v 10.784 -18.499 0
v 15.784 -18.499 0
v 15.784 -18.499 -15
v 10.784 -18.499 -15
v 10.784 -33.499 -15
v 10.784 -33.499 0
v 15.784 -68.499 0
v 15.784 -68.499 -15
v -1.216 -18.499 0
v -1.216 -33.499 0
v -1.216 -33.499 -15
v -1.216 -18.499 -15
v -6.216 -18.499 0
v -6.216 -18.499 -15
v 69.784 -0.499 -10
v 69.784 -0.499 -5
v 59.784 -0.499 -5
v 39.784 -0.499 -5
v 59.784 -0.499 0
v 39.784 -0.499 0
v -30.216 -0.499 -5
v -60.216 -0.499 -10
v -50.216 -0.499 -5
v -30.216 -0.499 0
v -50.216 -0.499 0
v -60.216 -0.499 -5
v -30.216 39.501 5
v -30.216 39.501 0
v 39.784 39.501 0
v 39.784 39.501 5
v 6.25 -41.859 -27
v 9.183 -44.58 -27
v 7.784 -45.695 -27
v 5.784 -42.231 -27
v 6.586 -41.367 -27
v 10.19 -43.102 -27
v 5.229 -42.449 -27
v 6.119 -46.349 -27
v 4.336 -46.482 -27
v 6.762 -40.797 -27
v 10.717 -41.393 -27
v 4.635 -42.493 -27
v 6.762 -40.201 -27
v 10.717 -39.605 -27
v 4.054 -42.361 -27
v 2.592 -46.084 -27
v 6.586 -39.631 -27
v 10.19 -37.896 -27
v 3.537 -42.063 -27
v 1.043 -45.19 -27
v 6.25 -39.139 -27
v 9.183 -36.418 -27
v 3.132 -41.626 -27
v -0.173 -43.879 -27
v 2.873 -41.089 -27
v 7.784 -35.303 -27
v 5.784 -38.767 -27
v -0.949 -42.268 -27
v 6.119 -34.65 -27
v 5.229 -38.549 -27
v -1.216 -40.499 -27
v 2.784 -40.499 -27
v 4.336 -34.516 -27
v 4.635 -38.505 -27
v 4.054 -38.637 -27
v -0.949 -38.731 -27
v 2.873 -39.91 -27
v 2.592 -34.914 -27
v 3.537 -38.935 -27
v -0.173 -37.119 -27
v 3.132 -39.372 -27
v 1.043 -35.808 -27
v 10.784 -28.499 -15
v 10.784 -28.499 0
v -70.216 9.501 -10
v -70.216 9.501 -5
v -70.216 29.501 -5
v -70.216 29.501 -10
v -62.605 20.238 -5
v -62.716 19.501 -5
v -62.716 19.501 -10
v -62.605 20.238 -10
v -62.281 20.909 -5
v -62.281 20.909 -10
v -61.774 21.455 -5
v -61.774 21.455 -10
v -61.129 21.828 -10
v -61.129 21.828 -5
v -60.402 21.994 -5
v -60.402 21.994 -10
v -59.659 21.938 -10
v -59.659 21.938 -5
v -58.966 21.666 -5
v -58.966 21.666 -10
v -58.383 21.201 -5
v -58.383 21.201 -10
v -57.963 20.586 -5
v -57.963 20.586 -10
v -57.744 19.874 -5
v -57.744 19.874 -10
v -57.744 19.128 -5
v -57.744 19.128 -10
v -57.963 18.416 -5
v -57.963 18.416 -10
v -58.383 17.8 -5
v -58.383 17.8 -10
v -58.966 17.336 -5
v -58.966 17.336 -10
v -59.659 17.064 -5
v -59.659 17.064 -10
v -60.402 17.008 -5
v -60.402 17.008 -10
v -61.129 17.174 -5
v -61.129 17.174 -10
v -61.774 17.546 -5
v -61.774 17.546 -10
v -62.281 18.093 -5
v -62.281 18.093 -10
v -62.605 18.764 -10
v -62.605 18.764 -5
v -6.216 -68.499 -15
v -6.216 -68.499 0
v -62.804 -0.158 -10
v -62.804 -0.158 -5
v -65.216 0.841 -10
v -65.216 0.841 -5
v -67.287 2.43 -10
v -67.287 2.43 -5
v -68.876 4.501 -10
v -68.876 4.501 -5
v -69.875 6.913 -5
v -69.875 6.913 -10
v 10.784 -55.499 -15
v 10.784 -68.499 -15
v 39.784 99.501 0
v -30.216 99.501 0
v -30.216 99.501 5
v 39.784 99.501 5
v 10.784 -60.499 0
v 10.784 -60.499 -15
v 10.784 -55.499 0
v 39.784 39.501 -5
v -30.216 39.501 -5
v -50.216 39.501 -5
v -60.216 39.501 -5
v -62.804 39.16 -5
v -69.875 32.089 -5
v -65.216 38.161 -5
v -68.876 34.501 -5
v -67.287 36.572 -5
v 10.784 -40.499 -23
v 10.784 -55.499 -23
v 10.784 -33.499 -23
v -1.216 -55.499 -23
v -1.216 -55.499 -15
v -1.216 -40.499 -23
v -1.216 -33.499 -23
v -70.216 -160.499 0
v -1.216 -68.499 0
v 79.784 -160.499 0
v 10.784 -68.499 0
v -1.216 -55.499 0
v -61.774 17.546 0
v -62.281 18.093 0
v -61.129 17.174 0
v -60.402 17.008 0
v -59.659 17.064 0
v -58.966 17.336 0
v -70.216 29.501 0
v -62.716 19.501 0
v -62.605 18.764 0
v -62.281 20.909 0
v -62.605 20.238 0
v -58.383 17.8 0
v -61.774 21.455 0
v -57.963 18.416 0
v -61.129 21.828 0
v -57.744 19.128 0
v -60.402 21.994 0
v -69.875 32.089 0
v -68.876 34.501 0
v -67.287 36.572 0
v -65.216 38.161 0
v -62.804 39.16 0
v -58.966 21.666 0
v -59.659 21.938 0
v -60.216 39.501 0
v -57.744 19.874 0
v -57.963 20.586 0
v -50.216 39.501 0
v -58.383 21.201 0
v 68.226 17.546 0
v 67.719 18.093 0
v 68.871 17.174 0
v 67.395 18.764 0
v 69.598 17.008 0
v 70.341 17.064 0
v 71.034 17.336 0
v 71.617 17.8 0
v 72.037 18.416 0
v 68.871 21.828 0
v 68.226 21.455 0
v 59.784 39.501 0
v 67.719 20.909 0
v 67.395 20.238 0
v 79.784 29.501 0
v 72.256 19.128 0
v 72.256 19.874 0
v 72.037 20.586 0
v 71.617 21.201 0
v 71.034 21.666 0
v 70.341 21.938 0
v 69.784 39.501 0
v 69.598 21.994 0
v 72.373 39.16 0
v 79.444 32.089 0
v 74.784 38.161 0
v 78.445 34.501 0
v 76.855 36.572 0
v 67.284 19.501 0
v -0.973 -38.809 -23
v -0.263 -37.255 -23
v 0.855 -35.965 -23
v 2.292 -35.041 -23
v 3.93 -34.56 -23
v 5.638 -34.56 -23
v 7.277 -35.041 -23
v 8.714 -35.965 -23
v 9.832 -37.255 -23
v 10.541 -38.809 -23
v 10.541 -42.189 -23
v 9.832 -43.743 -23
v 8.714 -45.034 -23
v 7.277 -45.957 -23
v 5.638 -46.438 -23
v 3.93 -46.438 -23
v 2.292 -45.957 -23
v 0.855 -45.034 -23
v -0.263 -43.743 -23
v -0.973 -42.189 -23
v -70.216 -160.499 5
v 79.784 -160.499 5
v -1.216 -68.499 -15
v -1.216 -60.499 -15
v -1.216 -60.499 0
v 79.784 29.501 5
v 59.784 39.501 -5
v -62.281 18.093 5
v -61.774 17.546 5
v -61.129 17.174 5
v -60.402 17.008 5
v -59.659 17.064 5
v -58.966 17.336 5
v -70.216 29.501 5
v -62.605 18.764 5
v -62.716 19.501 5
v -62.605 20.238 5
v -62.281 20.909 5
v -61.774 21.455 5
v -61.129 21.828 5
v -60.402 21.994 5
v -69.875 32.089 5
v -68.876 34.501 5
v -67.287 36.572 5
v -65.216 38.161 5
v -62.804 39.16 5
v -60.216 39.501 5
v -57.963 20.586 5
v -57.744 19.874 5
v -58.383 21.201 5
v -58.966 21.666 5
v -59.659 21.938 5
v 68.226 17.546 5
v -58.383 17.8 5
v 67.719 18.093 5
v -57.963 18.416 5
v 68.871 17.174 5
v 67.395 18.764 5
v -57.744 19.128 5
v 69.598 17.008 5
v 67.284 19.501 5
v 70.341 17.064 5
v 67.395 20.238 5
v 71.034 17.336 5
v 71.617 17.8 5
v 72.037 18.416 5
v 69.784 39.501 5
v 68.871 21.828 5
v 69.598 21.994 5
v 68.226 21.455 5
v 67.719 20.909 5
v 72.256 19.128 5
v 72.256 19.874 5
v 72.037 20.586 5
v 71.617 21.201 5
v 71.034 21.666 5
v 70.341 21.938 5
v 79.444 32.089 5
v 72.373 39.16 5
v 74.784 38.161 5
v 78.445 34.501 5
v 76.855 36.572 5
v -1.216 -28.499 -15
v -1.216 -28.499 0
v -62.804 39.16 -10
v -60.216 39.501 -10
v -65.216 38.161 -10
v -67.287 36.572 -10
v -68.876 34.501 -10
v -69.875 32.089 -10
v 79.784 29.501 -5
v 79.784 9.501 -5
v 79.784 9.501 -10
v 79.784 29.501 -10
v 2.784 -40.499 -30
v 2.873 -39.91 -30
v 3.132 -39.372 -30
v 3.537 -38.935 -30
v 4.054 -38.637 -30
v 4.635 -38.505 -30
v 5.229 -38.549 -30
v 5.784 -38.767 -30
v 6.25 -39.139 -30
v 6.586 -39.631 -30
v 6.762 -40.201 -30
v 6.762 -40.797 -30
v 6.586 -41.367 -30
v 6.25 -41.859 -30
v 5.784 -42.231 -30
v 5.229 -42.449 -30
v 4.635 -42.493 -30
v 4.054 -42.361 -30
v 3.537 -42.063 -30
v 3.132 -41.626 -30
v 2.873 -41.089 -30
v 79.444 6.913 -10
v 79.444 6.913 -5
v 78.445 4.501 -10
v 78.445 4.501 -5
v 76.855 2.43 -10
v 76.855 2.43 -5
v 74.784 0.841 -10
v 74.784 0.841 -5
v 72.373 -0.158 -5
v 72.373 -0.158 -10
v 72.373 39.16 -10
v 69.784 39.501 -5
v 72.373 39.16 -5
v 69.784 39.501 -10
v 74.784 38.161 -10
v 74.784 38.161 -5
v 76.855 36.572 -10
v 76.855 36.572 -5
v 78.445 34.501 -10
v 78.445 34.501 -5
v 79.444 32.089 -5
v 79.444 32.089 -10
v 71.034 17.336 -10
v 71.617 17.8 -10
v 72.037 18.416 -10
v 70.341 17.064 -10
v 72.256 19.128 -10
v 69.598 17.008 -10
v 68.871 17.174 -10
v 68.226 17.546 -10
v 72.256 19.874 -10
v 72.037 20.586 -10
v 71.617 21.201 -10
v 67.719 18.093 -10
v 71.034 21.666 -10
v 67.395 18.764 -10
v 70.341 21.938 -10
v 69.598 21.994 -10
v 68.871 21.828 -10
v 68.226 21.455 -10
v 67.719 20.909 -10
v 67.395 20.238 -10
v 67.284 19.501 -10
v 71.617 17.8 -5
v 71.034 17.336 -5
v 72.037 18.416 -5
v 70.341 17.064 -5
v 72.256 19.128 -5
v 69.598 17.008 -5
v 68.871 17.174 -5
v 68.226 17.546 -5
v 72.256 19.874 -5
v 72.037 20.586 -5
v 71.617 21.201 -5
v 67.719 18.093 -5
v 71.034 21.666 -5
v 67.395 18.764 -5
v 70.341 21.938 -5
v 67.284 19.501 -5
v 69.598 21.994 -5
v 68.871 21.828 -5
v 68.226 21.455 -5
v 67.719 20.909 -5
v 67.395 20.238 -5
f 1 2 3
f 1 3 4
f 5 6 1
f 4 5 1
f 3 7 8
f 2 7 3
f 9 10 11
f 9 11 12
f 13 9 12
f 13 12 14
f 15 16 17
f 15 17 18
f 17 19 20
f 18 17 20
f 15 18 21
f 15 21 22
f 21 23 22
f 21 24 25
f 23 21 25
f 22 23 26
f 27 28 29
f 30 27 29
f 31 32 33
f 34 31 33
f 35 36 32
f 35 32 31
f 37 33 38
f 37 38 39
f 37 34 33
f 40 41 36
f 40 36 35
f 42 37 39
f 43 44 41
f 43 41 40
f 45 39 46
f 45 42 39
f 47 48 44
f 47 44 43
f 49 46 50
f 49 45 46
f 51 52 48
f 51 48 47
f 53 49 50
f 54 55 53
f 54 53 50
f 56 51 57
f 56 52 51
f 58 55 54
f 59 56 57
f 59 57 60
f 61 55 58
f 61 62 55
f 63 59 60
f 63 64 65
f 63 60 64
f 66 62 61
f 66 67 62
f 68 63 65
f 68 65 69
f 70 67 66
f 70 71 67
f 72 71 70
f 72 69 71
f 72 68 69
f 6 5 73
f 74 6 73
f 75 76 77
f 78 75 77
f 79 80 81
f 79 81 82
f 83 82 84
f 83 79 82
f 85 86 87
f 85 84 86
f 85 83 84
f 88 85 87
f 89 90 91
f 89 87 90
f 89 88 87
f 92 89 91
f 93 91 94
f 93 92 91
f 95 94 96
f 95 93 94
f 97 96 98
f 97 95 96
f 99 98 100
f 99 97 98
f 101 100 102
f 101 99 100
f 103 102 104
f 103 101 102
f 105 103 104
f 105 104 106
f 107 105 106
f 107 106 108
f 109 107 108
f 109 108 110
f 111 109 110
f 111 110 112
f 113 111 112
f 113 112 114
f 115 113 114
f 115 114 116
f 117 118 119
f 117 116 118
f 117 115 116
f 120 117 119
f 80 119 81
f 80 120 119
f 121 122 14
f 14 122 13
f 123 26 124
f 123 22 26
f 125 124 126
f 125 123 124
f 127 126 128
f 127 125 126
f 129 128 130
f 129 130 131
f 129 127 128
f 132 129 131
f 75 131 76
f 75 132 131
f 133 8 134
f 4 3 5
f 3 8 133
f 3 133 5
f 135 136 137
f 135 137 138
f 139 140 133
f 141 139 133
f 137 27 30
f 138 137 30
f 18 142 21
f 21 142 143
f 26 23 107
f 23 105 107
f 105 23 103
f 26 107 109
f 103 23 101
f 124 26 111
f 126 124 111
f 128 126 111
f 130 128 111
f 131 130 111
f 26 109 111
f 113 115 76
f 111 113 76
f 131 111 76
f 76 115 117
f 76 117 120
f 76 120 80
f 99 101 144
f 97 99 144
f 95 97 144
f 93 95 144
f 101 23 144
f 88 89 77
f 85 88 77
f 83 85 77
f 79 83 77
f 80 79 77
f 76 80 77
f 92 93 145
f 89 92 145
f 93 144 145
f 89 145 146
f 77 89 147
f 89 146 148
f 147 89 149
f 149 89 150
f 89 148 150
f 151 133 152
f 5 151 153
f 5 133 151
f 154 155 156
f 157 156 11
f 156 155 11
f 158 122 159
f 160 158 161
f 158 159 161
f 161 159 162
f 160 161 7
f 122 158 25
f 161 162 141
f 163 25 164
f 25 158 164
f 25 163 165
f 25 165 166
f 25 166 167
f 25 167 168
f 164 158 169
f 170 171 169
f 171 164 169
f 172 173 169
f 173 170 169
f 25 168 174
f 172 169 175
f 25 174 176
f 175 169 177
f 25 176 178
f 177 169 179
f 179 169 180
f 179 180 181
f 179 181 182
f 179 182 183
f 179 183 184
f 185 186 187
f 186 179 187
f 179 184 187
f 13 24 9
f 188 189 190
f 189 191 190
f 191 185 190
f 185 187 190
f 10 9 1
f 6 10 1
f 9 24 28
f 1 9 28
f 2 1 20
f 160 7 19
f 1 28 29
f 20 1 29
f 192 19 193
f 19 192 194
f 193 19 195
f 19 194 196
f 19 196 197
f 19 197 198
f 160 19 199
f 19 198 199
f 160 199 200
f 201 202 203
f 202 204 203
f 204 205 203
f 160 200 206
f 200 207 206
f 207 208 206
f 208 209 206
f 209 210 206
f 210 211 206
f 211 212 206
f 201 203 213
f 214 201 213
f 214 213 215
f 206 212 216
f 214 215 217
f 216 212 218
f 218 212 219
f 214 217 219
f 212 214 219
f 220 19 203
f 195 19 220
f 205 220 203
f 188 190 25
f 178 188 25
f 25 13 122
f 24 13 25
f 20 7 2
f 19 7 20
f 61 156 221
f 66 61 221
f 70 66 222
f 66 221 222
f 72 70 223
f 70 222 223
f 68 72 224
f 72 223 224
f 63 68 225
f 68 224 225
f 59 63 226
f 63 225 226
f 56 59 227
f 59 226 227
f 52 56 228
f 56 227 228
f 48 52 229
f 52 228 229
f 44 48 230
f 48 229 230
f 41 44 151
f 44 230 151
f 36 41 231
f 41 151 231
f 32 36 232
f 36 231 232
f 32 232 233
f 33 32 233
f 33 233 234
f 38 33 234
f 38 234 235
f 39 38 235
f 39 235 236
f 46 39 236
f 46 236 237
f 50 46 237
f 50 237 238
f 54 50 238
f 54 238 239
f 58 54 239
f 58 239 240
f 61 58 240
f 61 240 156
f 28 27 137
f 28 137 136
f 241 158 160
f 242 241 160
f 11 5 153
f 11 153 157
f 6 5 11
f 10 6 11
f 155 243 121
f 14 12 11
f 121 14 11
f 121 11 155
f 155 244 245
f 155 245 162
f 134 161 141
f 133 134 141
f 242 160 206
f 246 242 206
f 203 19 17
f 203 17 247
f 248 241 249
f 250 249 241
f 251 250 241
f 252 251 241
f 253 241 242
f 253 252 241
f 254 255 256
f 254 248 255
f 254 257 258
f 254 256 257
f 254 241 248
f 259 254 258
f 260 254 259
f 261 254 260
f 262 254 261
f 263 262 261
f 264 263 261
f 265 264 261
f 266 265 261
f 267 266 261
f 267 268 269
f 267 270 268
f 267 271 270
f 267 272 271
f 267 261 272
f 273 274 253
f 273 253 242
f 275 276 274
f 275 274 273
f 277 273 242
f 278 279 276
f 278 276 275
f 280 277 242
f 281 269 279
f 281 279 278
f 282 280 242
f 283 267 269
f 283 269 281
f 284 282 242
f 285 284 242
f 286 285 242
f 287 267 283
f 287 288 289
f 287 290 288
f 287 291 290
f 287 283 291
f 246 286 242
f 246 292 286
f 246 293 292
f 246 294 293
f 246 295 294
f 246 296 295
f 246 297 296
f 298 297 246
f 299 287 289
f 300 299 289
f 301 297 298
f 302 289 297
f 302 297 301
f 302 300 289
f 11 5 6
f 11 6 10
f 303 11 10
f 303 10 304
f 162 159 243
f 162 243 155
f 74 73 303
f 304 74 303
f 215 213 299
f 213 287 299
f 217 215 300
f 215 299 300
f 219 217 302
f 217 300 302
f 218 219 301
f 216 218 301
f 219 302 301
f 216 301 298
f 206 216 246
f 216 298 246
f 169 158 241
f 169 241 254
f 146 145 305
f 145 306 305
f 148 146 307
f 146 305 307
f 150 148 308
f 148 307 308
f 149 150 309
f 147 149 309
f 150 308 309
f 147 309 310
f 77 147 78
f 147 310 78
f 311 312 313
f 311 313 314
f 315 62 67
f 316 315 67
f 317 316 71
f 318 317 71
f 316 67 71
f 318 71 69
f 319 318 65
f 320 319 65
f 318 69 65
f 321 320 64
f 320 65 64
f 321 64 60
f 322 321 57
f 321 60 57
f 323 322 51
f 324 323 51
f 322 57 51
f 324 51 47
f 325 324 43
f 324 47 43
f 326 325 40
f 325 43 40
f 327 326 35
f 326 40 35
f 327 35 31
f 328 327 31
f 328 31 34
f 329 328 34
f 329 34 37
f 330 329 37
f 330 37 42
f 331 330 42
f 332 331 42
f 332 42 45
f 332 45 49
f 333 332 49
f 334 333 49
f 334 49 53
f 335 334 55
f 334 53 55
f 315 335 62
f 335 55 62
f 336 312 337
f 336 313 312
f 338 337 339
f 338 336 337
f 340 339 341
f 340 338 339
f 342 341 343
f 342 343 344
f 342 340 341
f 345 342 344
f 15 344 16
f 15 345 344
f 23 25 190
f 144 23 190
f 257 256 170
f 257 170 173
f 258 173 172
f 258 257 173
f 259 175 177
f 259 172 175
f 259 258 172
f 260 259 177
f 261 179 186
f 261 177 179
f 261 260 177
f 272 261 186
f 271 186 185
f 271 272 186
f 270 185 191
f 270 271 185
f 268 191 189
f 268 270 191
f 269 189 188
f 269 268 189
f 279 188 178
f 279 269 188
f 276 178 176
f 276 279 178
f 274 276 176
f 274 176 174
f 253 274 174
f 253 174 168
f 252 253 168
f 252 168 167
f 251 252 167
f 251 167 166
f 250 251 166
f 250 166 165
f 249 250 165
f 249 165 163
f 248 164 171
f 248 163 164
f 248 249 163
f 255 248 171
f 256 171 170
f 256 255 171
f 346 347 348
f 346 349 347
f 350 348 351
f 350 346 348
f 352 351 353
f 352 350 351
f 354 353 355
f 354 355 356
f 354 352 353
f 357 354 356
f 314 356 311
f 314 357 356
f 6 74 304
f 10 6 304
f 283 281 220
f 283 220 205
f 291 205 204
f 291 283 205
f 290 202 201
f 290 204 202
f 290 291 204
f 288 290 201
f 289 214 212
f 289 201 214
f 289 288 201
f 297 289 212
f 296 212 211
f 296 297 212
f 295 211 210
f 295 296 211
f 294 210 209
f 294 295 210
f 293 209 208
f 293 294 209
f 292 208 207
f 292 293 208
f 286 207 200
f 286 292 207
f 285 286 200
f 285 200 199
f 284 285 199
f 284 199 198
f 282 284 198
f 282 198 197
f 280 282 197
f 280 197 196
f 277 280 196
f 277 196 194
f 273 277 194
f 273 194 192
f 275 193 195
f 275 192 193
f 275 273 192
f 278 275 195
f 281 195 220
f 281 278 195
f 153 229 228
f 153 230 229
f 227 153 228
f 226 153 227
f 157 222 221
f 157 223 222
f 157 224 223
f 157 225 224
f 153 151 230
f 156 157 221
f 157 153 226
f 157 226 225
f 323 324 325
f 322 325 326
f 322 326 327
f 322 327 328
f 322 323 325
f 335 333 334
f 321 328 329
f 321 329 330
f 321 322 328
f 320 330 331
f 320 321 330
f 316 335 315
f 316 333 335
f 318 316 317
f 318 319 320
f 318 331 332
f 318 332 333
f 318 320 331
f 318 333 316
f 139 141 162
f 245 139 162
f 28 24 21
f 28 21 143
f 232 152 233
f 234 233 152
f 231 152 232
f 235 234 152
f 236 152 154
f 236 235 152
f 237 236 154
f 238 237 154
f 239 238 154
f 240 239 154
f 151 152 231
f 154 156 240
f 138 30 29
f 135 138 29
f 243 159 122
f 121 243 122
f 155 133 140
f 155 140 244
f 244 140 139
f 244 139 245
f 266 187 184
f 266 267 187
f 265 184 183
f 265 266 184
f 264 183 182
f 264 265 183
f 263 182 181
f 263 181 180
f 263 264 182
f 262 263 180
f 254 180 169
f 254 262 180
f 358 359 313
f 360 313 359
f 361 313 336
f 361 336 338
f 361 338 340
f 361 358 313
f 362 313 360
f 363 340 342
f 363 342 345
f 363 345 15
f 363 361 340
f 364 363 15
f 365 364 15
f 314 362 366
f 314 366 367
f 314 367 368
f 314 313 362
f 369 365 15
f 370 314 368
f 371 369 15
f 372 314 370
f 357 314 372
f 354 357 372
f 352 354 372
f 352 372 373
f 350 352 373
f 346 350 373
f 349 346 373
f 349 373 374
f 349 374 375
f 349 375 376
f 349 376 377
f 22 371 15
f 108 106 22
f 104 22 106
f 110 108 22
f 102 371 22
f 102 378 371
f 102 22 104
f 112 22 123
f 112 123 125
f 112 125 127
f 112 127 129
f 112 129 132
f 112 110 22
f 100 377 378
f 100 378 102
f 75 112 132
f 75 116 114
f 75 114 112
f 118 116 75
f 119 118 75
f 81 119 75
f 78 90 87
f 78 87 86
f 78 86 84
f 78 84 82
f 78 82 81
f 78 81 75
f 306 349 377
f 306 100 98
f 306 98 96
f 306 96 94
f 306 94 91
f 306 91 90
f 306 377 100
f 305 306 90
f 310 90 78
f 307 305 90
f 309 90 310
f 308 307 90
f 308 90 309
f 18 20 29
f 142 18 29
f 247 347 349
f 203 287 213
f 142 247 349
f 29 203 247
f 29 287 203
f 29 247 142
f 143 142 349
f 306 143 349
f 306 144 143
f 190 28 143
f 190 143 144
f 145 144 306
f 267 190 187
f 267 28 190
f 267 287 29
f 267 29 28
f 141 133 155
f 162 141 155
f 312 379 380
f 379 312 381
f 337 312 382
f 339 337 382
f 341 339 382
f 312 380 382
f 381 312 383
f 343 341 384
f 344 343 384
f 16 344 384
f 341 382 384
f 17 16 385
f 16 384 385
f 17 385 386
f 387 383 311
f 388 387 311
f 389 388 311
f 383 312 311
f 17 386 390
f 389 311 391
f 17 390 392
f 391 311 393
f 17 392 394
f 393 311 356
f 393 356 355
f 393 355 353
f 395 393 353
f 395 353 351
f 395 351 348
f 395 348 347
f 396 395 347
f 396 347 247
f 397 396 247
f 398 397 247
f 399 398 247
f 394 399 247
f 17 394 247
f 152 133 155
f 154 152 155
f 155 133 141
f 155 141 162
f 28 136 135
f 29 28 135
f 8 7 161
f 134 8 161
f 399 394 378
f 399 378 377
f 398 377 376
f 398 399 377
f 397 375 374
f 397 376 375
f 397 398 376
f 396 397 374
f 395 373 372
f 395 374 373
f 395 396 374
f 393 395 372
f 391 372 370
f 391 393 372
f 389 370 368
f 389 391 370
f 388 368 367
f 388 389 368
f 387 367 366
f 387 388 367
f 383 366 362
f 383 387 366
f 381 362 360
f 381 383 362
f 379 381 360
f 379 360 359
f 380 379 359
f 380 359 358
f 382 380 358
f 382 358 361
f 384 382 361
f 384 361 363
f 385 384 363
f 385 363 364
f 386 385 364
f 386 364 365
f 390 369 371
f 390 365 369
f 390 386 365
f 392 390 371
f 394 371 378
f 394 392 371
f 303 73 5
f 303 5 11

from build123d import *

# Parameters (mm, degrees)
SKETCH2_W               = 150
SKETCH2_H               = 200
BOSS_EXTRUDE1_DEPTH     = 5
SKETCH4_W               = 20
SKETCH4_H               = 40
BOSS_EXTRUDE2_DEPTH     = 5
SKETCH6_W               = 150
SKETCH6_H               = 40
BOSS_EXTRUDE3_DEPTH     = 5
CUT_EXTRUDE1_DEPTH      = 180.514612304
CUT_EXTRUDE1_DEPTH_BACK = 180.514612304
SKETCH7_R               = 2.5
FILLET1_R               = 10
FILLET2_R               = 10
FILLET3_R               = 10
FILLET4_R               = 10
FILLET5_R               = 10
FILLET6_R               = 10
SKETCH9_W               = 12
SKETCH9_H               = 22
BOSS_EXTRUDE4_DEPTH     = 23
SKETCH10_R              = 6
BOSS_EXTRUDE5_DEPTH     = 4
SKETCH11_R              = 2
BOSS_EXTRUDE6_DEPTH     = 3
SKETCH12_W              = 5
SKETCH12_H              = 50
BOSS_EXTRUDE7_DEPTH     = 15
SKETCH13_W              = 12
SKETCH13_H              = 5
BOSS_EXTRUDE10_DEPTH    = 15
BOSS_EXTRUDE10_2_DEPTH  = 15
SKETCH15_W              = 70
SKETCH15_H              = 15
BOSS_EXTRUDE11_DEPTH    = 60
SKETCH16_W              = 70
SKETCH16_H              = 10
CUT_EXTRUDE2_DEPTH      = 60


with BuildPart() as part:
    # Sketch2 → Boss-Extrude1 (new body)
    with BuildSketch(Plane.XY):
        with Locations((4.784343526, -60.49907962)):
            Rectangle(SKETCH2_W, SKETCH2_H)
    extrude(amount=BOSS_EXTRUDE1_DEPTH)

    # Sketch4 → Boss-Extrude2 (add)
    with BuildSketch(Plane(origin=(0, 0, 0), x_dir=(-1, 0, 0), z_dir=(0, 0, -1))):
        with Locations((-49.784343526, 19.50092038)):
            Rectangle(SKETCH4_W, SKETCH4_H)
        with Locations((40.215656474, 19.50092038)):
            Rectangle(SKETCH4_W, SKETCH4_H)
    extrude(amount=BOSS_EXTRUDE2_DEPTH)

    # Sketch6 → Boss-Extrude3 (add)
    with BuildSketch(Plane(origin=(0, 0, -5), x_dir=(-1, 0, 0), z_dir=(0, 0, -1))):
        with Locations((-4.784343526, 19.50092038)):
            Rectangle(SKETCH6_W, SKETCH6_H)
    extrude(amount=BOSS_EXTRUDE3_DEPTH)

    # Sketch7 → Cut-Extrude1 (cut, two sides: drawn at the far end of the back side and taken through both)
    with BuildSketch(Plane(origin=(0, 0, 0), x_dir=(-1, 0, 0), z_dir=(0, 0, -1)).offset(-CUT_EXTRUDE1_DEPTH_BACK)):
        with Locations((-69.784343526, 19.50092038)):
            Circle(SKETCH7_R)
        with Locations((60.215656474, 19.50092038)):
            Circle(SKETCH7_R)
    extrude(amount=CUT_EXTRUDE1_DEPTH + CUT_EXTRUDE1_DEPTH_BACK, mode=Mode.SUBTRACT)

    # Fillet1
    fillet1_edges = [part.edges().sort_by_distance(p)[0] for p in [
        (-70.215656474, 39.50092038, -7.5),
    ]]
    fillet(fillet1_edges, radius=FILLET1_R)

    # Fillet2
    fillet2_edges = [part.edges().sort_by_distance(p)[0] for p in [
        (-70.215656474, 39.50092038, 2.5),
    ]]
    fillet(fillet2_edges, radius=FILLET2_R)

    # Fillet3
    fillet3_edges = [part.edges().sort_by_distance(p)[0] for p in [
        (79.784343526, 39.50092038, 2.5),
    ]]
    fillet(fillet3_edges, radius=FILLET3_R)

    # Fillet4
    fillet4_edges = [part.edges().sort_by_distance(p)[0] for p in [
        (79.784343526, 39.50092038, -7.5),
    ]]
    fillet(fillet4_edges, radius=FILLET4_R)

    # Fillet5
    fillet5_edges = [part.edges().sort_by_distance(p)[0] for p in [
        (79.784343526, -0.49907962, -7.5),
    ]]
    fillet(fillet5_edges, radius=FILLET5_R)

    # Fillet6
    fillet6_edges = [part.edges().sort_by_distance(p)[0] for p in [
        (-70.215656474, -0.49907962, -7.5),
    ]]
    fillet(fillet6_edges, radius=FILLET6_R)

    # Sketch9 → Boss-Extrude4 (add)
    with BuildSketch(Plane(origin=(0, 0, 0), x_dir=(-1, 0, 0), z_dir=(0, 0, -1))):
        with Locations((-4.784343526, -44.49907962)):
            Rectangle(SKETCH9_W, SKETCH9_H)
    extrude(amount=BOSS_EXTRUDE4_DEPTH)

    # Sketch10 → Boss-Extrude5 (add)
    with BuildSketch(Plane(origin=(0, 0, -23), x_dir=(-1, 0, 0), z_dir=(0, 0, -1))):
        with Locations((-4.784343526, -40.49907962)):
            Circle(SKETCH10_R)
    extrude(amount=BOSS_EXTRUDE5_DEPTH)

    # Sketch11 → Boss-Extrude6 (add)
    with BuildSketch(Plane(origin=(0, 0, -27), x_dir=(-1, 0, 0), z_dir=(0, 0, -1))):
        with Locations((-4.784343526, -40.49907962)):
            Circle(SKETCH11_R)
    extrude(amount=BOSS_EXTRUDE6_DEPTH)

    # Sketch12 → Boss-Extrude7 (add)
    with BuildSketch(Plane(origin=(0, 0, 0), x_dir=(-1, 0, 0), z_dir=(0, 0, -1))):
        with Locations((-13.284343526, -43.49907962)):
            Rectangle(SKETCH12_W, SKETCH12_H)
        with Locations((3.715656474, -43.49907962)):
            Rectangle(SKETCH12_W, SKETCH12_H)
    extrude(amount=BOSS_EXTRUDE7_DEPTH)


with BuildPart() as body_2:
    # Sketch13 → Boss-Extrude10 (new body)
    with BuildSketch(Plane(origin=(0, 0, -15), x_dir=(-1, 0, 0), z_dir=(0, 0, -1))):
        with Locations((-4.784343526, -30.99907962)):
            Rectangle(SKETCH13_W, SKETCH13_H)
    extrude(amount=-BOSS_EXTRUDE10_DEPTH)


with BuildPart() as body_3:
    # Sketch13 → Boss-Extrude10 2 (new body)
    with BuildSketch(Plane(origin=(0, 0, -15), x_dir=(-1, 0, 0), z_dir=(0, 0, -1))):
        with Locations((-4.784343526, -57.99907962)):
            Rectangle(SKETCH13_W, SKETCH13_H)
    extrude(amount=-BOSS_EXTRUDE10_2_DEPTH)


with BuildPart() as body_4:
    # Sketch15 → Boss-Extrude11 (new body)
    with BuildSketch(Plane(origin=(0, 39.50092038, 0), x_dir=(1, 0, 0), z_dir=(0, 1, 0))):
        with Locations((4.784343526, 2.5)):
            Rectangle(SKETCH15_W, SKETCH15_H)
    extrude(amount=BOSS_EXTRUDE11_DEPTH)

    # Sketch16 → Cut-Extrude2 (cut)
    with BuildSketch(Plane(origin=(0, 99.50092038, 0), x_dir=(1, 0, 0), z_dir=(0, 1, 0))):
        with Locations((4.784343526, 5)):
            Rectangle(SKETCH16_W, SKETCH16_H)
    extrude(amount=-CUT_EXTRUDE2_DEPTH, mode=Mode.SUBTRACT)


solid = Compound([part.part, body_2.part, body_3.part, body_4.part])
